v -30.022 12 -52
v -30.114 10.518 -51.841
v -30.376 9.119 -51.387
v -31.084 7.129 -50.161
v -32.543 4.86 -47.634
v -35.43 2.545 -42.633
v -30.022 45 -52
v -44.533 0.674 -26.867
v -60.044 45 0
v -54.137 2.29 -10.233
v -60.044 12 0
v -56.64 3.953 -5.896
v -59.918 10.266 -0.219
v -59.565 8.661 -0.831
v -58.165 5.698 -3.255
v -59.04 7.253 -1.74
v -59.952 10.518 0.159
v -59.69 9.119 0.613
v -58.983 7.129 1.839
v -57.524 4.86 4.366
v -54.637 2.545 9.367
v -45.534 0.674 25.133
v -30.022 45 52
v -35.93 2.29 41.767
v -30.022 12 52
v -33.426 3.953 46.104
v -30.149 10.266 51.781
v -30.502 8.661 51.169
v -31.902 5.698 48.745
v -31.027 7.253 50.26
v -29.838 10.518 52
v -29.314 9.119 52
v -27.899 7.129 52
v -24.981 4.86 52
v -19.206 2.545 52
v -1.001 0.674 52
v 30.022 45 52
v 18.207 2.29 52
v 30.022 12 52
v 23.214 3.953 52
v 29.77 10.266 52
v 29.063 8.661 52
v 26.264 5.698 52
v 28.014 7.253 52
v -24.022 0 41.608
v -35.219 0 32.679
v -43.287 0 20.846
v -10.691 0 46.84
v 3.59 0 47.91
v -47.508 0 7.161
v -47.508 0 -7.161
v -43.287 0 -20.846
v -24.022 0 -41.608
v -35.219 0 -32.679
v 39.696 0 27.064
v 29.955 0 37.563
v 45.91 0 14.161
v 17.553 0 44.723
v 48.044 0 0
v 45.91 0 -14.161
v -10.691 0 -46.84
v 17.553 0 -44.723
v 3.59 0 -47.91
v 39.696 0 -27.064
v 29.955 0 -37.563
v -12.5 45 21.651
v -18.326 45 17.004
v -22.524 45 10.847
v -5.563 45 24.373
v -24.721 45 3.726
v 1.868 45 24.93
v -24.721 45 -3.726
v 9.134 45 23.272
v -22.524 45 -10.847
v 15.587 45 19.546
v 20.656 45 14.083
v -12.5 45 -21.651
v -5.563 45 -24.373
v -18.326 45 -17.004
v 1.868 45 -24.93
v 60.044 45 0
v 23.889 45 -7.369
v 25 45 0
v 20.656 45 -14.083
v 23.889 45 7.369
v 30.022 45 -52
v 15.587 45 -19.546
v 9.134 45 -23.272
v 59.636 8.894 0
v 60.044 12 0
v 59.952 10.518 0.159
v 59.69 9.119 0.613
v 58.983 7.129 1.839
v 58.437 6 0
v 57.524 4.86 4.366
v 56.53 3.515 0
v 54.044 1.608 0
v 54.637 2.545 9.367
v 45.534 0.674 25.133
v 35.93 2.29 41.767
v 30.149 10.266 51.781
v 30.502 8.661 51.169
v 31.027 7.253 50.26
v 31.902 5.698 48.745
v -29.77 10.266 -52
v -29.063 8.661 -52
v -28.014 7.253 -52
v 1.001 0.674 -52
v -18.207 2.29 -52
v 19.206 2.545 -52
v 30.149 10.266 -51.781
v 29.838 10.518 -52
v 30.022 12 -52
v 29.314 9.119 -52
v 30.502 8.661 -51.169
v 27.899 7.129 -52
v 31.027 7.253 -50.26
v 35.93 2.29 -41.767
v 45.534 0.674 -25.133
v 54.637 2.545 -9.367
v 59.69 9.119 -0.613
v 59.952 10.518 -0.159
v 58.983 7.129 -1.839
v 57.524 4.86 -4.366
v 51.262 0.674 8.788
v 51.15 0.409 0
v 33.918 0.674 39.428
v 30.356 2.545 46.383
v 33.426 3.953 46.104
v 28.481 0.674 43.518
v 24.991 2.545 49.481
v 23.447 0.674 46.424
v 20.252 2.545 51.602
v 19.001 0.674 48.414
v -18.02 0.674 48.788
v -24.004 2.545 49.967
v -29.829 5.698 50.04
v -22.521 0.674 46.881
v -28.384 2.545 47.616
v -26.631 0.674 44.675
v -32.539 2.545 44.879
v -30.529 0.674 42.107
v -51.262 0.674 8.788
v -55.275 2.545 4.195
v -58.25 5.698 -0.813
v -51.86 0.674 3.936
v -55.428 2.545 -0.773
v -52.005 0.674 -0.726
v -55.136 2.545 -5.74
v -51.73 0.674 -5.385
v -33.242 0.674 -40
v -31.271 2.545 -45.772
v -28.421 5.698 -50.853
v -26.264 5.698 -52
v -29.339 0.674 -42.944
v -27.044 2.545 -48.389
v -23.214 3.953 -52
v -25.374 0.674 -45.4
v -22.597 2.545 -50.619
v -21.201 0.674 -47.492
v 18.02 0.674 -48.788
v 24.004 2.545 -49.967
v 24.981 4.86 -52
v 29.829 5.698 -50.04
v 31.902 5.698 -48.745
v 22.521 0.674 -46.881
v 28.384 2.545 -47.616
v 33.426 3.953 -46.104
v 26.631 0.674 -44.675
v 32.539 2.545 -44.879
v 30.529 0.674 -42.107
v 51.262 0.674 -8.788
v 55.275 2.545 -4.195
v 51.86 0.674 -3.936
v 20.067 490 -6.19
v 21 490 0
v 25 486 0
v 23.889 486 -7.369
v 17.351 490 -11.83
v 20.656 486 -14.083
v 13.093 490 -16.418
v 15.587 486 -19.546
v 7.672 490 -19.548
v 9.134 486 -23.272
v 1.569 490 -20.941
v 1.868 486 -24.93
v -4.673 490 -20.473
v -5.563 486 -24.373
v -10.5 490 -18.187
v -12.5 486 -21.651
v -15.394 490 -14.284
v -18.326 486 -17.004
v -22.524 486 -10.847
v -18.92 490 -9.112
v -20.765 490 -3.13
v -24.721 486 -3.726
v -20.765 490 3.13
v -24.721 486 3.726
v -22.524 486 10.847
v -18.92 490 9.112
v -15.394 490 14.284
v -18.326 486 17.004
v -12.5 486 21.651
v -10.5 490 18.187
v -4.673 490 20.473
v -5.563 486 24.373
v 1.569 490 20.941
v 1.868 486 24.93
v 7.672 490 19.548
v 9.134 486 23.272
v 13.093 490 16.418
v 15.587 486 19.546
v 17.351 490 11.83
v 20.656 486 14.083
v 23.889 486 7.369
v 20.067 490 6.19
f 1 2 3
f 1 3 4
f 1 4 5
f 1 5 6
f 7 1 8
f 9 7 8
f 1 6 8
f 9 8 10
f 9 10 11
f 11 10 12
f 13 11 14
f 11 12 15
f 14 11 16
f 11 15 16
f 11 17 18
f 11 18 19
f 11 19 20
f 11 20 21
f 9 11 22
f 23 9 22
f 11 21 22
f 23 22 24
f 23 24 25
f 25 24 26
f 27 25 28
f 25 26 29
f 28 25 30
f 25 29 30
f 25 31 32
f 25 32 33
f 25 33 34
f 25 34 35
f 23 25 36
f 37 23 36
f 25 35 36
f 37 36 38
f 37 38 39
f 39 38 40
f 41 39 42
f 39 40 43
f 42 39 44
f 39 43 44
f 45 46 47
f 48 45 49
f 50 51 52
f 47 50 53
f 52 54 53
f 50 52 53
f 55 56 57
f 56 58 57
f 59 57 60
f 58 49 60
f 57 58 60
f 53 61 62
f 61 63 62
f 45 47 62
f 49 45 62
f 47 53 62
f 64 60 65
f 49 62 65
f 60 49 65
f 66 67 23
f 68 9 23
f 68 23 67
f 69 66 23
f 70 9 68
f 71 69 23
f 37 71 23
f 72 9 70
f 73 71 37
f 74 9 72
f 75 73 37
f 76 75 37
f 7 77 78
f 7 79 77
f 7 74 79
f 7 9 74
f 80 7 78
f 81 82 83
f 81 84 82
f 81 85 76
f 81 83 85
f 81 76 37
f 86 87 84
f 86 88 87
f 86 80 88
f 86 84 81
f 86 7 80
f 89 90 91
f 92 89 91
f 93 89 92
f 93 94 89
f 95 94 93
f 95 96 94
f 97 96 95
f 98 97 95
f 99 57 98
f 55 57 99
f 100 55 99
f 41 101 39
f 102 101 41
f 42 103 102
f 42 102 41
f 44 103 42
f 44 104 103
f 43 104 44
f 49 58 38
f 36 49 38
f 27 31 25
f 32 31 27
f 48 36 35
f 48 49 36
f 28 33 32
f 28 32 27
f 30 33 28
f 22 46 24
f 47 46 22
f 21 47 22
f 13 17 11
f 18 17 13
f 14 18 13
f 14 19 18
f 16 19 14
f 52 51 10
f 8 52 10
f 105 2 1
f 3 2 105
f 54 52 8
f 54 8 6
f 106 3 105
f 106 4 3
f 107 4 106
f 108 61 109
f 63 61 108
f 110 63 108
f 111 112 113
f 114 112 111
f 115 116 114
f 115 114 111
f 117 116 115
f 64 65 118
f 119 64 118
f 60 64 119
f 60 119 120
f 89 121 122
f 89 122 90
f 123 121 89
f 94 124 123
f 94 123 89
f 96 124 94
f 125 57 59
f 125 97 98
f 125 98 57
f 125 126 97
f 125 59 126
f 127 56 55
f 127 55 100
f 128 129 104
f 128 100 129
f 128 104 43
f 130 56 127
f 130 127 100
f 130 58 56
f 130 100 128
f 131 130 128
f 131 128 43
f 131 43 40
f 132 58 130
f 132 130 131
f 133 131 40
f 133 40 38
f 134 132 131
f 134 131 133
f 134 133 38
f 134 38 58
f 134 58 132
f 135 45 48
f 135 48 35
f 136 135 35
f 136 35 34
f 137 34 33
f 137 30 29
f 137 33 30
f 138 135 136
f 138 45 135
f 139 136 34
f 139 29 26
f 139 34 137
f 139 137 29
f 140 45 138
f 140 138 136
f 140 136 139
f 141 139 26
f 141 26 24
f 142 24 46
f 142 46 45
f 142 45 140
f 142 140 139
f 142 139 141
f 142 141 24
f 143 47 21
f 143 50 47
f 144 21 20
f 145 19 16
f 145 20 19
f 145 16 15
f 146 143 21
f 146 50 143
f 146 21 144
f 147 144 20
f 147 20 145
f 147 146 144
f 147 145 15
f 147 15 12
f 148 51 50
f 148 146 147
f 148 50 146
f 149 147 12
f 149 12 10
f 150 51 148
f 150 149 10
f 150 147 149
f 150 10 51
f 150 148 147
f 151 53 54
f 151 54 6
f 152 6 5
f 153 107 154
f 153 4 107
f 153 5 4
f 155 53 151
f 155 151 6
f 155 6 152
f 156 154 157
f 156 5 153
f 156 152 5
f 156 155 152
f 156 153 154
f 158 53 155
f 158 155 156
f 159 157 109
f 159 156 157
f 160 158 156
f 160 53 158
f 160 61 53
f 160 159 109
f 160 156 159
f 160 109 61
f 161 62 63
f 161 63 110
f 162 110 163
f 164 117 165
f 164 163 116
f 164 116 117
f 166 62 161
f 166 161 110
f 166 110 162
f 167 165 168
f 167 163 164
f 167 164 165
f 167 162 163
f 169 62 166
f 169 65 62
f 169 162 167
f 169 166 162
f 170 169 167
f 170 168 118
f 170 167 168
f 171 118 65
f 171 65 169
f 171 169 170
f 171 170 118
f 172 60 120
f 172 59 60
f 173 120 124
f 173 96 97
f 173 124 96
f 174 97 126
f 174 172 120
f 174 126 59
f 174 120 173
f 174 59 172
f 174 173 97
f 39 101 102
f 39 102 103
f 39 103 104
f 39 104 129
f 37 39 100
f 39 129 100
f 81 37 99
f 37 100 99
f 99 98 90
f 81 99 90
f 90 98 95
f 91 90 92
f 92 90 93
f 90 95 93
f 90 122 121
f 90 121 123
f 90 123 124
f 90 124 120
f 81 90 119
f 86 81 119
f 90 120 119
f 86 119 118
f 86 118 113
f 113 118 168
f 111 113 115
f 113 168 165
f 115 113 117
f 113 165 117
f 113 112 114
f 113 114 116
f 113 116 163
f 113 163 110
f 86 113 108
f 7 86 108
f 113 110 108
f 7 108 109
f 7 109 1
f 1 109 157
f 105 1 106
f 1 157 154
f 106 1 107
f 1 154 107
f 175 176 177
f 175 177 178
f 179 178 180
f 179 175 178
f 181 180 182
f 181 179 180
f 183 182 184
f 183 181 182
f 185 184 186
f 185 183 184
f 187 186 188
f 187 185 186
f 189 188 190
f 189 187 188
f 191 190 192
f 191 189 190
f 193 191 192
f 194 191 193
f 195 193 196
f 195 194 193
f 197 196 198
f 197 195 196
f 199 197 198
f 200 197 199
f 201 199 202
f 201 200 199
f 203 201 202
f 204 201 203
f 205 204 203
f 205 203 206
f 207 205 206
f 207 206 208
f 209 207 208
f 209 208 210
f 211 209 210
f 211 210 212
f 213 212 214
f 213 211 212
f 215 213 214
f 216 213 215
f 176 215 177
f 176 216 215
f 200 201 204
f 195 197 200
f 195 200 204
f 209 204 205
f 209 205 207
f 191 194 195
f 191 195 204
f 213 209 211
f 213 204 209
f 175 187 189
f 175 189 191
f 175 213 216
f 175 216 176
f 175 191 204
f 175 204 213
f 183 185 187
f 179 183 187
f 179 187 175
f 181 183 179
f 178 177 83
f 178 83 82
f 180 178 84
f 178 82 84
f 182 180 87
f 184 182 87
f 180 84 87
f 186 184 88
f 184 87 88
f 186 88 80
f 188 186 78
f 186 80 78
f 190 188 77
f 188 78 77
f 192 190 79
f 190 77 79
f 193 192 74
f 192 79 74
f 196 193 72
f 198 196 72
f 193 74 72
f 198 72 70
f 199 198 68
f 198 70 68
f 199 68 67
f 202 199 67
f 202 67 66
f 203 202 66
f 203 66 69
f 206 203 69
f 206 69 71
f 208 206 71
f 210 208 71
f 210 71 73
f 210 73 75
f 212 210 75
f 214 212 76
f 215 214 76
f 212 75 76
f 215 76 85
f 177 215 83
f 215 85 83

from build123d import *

# Parameters (mm, degrees)
BOSS_EXTRUDE1_DEPTH = 45
SKETCH2_R           = 25
BOSS_EXTRUDE2_DEPTH = 445
CHAMFER1_SIZE       = 4


with BuildPart() as part:
    # Sketch1 → Boss-Extrude1 (new body)
    with BuildSketch(Plane(origin=(0, 0, 0), x_dir=(1, 0, 0), z_dir=(0, 1, 0))):
        Polygon((-60.044427996, 0), (-30.022213998, -52), (30.022213998, -52), (60.044427996, 0), (30.022213998, 52), (-30.022213998, 52), align=None)
    extrude(amount=BOSS_EXTRUDE1_DEPTH)

    # Sketch2 → Boss-Extrude2 (add)
    with BuildSketch(Plane(origin=(0, 45, 0), x_dir=(1, 0, 0), z_dir=(0, 1, 0))):
        Circle(SKETCH2_R)
    extrude(amount=BOSS_EXTRUDE2_DEPTH)

    # Sketch3 → Cut-Revolve1 (revolve, cut)
    with BuildSketch(Plane.XY):
        with BuildLine():
            Line((48.044427996, 0), (60.044427996, 0))
            Line((60.044427996, 0), (60.044427996, 12))
            ThreePointArc((60.044427996, 12), (56.52970937, 3.514718626), (48.044427996, 0))
        make_face()
    revolve(axis=Axis((0, 490, 0), (0, -1, 0)), mode=Mode.SUBTRACT)

    # Chamfer1
    chamfer1_edges = [part.edges().sort_by_distance(p)[0] for p in [
        (-25, 490, 0),
    ]]
    chamfer(chamfer1_edges, length=CHAMFER1_SIZE)


solid = part.part
